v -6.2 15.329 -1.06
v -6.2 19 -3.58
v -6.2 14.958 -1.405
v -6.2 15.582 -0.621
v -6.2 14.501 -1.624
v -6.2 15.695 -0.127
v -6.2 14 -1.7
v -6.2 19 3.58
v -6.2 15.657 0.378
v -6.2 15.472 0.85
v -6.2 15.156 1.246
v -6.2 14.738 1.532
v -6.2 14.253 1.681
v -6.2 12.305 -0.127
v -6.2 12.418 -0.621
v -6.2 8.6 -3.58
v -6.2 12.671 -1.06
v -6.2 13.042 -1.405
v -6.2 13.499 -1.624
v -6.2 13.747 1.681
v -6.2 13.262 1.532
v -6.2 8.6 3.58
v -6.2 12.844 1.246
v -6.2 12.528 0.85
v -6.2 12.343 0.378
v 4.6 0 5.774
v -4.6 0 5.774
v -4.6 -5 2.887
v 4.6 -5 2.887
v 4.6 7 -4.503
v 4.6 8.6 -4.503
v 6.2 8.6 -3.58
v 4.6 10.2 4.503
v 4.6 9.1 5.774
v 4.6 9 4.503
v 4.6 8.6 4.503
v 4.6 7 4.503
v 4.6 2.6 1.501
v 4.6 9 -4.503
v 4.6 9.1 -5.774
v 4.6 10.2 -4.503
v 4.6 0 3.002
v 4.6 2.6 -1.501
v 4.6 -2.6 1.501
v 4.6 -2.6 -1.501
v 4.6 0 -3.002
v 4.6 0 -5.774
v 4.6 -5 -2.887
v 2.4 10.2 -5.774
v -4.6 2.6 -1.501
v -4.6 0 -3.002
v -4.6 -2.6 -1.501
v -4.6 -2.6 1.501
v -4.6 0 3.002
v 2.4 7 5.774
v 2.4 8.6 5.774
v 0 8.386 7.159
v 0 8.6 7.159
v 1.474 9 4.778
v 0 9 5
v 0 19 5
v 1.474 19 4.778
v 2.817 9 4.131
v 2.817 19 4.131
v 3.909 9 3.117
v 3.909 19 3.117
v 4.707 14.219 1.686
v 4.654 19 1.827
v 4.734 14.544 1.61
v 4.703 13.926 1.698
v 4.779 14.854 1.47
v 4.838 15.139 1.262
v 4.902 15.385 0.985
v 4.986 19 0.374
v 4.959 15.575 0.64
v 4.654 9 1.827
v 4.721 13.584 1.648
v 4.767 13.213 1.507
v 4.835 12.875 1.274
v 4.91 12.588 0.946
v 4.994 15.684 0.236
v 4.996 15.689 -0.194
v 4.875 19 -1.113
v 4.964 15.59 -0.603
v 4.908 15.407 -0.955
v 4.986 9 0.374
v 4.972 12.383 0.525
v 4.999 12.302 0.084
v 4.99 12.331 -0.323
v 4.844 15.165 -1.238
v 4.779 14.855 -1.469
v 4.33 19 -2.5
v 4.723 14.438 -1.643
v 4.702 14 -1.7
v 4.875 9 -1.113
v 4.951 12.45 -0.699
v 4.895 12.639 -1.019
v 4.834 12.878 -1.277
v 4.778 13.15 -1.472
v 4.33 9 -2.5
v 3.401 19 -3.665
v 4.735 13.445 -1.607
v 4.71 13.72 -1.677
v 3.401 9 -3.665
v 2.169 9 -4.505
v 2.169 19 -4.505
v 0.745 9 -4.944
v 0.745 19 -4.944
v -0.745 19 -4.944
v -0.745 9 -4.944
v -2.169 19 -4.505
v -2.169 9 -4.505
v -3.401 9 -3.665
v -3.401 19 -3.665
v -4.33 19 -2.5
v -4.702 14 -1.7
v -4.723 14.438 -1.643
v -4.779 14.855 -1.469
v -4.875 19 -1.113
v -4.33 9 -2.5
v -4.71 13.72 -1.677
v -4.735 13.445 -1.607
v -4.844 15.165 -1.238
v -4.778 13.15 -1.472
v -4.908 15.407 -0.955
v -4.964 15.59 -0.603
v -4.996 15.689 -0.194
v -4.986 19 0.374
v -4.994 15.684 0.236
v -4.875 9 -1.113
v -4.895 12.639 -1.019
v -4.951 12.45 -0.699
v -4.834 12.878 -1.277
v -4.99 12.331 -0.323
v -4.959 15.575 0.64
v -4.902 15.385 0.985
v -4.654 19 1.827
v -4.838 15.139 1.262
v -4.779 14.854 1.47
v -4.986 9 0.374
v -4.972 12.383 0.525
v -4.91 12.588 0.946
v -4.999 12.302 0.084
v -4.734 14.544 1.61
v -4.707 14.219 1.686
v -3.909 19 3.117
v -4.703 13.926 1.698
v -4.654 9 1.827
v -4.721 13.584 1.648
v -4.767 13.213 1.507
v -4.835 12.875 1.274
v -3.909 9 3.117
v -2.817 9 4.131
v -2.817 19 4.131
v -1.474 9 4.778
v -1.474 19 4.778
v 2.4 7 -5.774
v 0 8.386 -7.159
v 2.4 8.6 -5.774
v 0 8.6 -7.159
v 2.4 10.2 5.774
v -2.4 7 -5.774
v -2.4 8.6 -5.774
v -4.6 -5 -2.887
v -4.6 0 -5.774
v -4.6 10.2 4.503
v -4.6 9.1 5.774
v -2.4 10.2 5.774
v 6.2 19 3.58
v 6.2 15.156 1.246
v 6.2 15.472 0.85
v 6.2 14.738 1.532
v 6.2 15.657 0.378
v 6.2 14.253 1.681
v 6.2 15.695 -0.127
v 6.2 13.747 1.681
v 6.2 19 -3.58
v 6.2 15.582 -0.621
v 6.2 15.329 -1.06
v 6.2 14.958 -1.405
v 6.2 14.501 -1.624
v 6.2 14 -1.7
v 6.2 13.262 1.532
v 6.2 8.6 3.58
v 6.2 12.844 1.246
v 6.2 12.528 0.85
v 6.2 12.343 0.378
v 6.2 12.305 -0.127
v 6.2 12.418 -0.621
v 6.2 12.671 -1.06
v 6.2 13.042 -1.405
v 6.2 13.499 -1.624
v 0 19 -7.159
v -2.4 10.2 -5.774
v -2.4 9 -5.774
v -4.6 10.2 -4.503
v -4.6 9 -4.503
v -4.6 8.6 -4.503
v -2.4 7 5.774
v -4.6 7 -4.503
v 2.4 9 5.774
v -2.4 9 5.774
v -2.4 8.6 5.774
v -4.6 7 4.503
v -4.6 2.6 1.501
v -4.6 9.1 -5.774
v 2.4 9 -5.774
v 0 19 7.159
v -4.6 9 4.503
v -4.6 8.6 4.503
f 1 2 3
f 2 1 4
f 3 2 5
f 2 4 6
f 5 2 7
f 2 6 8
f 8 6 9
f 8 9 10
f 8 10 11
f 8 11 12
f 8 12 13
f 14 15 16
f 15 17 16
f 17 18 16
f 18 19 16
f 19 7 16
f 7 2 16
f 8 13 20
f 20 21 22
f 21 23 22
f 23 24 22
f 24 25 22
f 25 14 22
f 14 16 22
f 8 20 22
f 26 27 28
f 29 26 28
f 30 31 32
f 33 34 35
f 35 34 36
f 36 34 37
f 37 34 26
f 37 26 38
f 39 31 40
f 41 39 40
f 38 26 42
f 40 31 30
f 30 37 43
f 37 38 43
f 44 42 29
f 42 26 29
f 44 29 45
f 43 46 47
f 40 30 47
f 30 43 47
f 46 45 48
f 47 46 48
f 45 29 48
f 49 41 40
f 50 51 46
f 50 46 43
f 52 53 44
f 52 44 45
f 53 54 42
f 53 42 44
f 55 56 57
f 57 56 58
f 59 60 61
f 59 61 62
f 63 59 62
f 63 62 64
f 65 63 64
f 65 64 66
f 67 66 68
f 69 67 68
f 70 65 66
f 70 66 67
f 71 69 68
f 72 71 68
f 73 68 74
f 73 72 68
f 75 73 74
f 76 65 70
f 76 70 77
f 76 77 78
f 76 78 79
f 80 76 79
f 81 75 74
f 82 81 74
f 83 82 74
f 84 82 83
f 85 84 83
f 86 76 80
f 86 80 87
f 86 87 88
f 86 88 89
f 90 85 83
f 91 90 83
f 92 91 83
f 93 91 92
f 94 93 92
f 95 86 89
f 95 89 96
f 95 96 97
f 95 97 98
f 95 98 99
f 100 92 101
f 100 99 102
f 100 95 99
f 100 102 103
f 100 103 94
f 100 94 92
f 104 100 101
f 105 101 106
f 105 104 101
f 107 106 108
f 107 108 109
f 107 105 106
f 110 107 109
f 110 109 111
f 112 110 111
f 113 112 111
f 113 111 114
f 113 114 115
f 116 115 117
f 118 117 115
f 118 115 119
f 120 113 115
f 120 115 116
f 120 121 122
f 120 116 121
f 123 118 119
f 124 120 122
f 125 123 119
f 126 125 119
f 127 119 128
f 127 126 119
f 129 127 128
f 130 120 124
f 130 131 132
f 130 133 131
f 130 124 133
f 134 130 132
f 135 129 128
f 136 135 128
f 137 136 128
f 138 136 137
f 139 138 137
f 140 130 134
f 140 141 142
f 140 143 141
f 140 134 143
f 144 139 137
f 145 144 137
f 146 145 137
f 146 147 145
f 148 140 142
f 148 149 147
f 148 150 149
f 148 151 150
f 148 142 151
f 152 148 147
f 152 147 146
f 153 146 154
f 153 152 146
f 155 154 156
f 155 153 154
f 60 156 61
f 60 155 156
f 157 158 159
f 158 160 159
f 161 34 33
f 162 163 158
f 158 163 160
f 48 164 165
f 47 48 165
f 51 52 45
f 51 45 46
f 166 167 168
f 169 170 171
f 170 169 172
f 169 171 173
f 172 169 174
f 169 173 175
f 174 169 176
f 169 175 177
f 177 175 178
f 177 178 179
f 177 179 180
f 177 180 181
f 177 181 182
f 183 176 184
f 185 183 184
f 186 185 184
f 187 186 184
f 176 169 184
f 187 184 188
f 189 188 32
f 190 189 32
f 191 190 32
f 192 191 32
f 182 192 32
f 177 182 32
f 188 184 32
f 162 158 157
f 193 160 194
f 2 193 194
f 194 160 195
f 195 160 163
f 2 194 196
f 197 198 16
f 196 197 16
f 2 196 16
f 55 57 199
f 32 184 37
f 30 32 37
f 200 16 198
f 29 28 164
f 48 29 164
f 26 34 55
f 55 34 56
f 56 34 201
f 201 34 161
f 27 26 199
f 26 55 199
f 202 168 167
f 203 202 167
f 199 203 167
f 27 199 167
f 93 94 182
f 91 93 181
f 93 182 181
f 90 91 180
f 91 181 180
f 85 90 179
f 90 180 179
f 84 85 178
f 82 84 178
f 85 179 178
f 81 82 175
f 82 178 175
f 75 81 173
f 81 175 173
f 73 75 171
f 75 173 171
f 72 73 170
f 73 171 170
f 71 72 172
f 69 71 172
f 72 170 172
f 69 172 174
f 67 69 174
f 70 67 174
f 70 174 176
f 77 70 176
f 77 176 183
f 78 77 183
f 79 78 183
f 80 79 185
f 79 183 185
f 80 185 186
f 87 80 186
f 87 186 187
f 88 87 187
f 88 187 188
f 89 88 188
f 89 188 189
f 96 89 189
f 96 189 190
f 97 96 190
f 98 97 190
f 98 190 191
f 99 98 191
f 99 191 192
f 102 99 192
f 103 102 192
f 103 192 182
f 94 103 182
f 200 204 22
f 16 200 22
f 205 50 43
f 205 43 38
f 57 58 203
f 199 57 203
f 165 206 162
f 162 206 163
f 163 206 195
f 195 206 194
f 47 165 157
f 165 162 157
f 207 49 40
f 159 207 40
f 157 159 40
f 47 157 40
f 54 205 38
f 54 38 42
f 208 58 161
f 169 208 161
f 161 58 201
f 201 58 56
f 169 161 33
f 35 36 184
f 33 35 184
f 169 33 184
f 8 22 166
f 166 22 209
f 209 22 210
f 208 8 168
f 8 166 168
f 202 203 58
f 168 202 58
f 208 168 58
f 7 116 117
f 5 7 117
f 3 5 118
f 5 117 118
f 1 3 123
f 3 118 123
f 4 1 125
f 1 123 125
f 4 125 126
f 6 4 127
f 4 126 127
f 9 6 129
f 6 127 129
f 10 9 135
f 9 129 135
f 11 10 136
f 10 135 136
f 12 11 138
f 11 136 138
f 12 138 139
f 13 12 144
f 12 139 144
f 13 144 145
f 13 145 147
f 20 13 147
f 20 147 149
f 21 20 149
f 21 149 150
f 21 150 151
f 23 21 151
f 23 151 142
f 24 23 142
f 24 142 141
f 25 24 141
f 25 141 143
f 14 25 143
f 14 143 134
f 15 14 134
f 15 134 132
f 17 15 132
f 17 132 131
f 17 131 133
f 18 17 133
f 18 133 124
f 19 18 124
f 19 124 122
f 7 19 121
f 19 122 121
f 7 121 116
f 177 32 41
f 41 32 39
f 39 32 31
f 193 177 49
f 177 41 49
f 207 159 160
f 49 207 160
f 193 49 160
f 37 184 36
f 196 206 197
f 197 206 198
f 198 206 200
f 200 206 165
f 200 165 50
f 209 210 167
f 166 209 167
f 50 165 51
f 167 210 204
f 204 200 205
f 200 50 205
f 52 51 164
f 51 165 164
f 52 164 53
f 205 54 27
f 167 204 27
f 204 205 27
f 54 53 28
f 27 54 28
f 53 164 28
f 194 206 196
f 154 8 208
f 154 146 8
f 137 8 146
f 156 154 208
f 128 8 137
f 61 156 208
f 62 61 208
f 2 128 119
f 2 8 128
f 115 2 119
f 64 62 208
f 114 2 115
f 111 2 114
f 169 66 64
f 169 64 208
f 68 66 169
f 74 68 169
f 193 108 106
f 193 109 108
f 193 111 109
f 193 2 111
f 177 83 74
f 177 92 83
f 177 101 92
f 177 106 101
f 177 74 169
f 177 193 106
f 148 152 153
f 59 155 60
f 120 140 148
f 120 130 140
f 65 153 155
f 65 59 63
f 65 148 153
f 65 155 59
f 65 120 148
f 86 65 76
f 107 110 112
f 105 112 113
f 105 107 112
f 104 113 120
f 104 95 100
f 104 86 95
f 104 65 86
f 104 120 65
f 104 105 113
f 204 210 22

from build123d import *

# Parameters (mm, degrees)
SALIENTE_EXTRUIR1_DEPTH      = 4.6
SALIENTE_EXTRUIR1_DEPTH_BACK = 4.6
SALIENTE_EXTRUIR2_START      = 4
CROQUIS2_R                   = 5
SALIENTE_EXTRUIR2_DEPTH      = 10
CROQUIS4_W                   = 9.2
CROQUIS4_H                   = 2.771281292
SALIENTE_EXTRUIR3_DEPTH      = 9
SALIENTE_EXTRUIR4_START      = 2.6
CROQUIS4_3_W                 = 9.2
CROQUIS4_3_H                 = 6.0044428
SALIENTE_EXTRUIR4_DEPTH      = 6.4
SALIENTE_EXTRUIR5_START      = 3.6
CROQUIS2_2_R                 = 5
SALIENTE_EXTRUIR5_DEPTH      = 0.4
CHAFL_N1_SIZE                = 1.2
CHAFL_N2_SIZE                = 1.6
CROQUIS5_R                   = 1.7
CORTAR_EXTRUIR1_DEPTH        = 24.791034726


with BuildPart() as part:
    # Croquis1 → Saliente-Extruir1 (new, two sides: drawn at the far end of the back side and taken through both)
    with BuildSketch(Plane(origin=(0, 0, 0), x_dir=(0, 0, -1), z_dir=(1, 0, 0)).offset(-SALIENTE_EXTRUIR1_DEPTH_BACK)):
        Polygon((2.886751346, 5), (-2.886751346, 5), (-5.773502692, 0), (-2.886751346, -5), (2.886751346, -5), (5.773502692, 0), align=None)
        Polygon((3.0022214, 0), (1.5011107, 2.6), (-1.5011107, 2.6), (-3.0022214, 0), (-1.5011107, -2.6), (1.5011107, -2.6), align=None, mode=Mode.SUBTRACT)
    extrude(amount=SALIENTE_EXTRUIR1_DEPTH + SALIENTE_EXTRUIR1_DEPTH_BACK)



with BuildPart() as body_2:
    # Croquis2 → Saliente-Extruir2 (new body)
    with BuildSketch(Plane(origin=(0, 5, 0), x_dir=(1, 0, 0), z_dir=(0, 1, 0)).offset(SALIENTE_EXTRUIR2_START)):
        Polygon((0, 7.159143338), (-6.2, 3.579571669), (-6.2, -3.579571669), (0, -7.159143338), (6.2, -3.579571669), (6.2, 3.579571669), align=None)
        with Locations(Location((0, 0, 0), (0, 0, 270))):
            Circle(CROQUIS2_R, mode=Mode.SUBTRACT)
    extrude(amount=SALIENTE_EXTRUIR2_DEPTH)


with BuildPart() as part_1:
    add(part.part)

    add(body_2.part)  # Saliente-Extruir3 merges body 2
    # Croquis4 → Saliente-Extruir3 (add)
    with BuildSketch(Plane(origin=(0, 0, 0), x_dir=(1, 0, 0), z_dir=(0, 1, 0))):
        with Locations((0, -4.387862046)):
            Rectangle(CROQUIS4_W, CROQUIS4_H)
        with Locations((0, 4.387862046)):
            Rectangle(CROQUIS4_W, CROQUIS4_H)
    extrude(amount=SALIENTE_EXTRUIR3_DEPTH)

    # Croquis4<3> → Saliente-Extruir4 (add)
    with BuildSketch(Plane(origin=(0, 0, 0), x_dir=(1, 0, 0), z_dir=(0, 1, 0)).offset(SALIENTE_EXTRUIR4_START)):
        Rectangle(CROQUIS4_3_W, CROQUIS4_3_H)
    extrude(amount=SALIENTE_EXTRUIR4_DEPTH)

    # Croquis2<2> → Saliente-Extruir5 (add)
    # profile 1 of 2: a face of its own
    with BuildSketch(Plane(origin=(0, 5, 0), x_dir=(1, 0, 0), z_dir=(0, 1, 0)).offset(SALIENTE_EXTRUIR5_START)):
        Polygon((6.2, -3.579571669), (6.2, 3.579571669), (0, 7.159143338), (-6.2, 3.579571669), (-6.2, -3.579571669), (0, -7.159143338), align=None)
        with Locations(Location((0, 0, 0), (0, 0, 270))):
            Circle(CROQUIS2_2_R, mode=Mode.SUBTRACT)
    # profile 2 of 2: a face of its own
    with BuildSketch(Plane(origin=(0, 5, 0), x_dir=(1, 0, 0), z_dir=(0, 1, 0)).offset(SALIENTE_EXTRUIR5_START)):
        with Locations(Location((0, 0, 0), (0, 0, 270))):
            Circle(CROQUIS2_2_R)
    extrude(amount=SALIENTE_EXTRUIR5_DEPTH)

    # Chaflán1
    # the kernel refuses this chamfer: 1.2 mm, written as the material it adds along each edge
    with BuildSketch(Plane(origin=(-0.272571358, 9, 7.316512485), x_dir=(0.49981095845564805, -0.027495876610585935, 0.8656979742248805), z_dir=(0.8660254037844388, 0, -0.49999999999999967))) as chafl_n1_piece_1_section:
        Polygon((CHAFL_N1_SIZE * 0.999621916911, -CHAFL_N1_SIZE * 0.0274958766106), (-CHAFL_N1_SIZE * 0.0274958766106, -CHAFL_N1_SIZE * 0.999621916911), (0, 0), align=None)
    chafl_n1_piece_1 = extrude(amount=8.712380356, mode=Mode.PRIVATE)
    chafl_n1_piece_1 = split(chafl_n1_piece_1, bisect_by=Plane(origin=(4.6, 9.457, 5.303539573), z_dir=(-1, 0, 0)), keep=Keep.TOP, mode=Mode.PRIVATE)
    chafl_n1_piece_1 = split(chafl_n1_piece_1, bisect_by=Plane(origin=(3.786, 9.457, 5.773502692), z_dir=(0, 0, -1)), keep=Keep.TOP, mode=Mode.PRIVATE)
    add(chafl_n1_piece_1)
    with BuildSketch(Plane(origin=(-7.272571358, 9, 2.960322307), x_dir=(-0.4998109584556484, -0.027495876610585918, 0.8656979742248802), z_dir=(0.8660254037844387, 0, 0.5000000000000001))) as chafl_n1_piece_2_section:
        Polygon((CHAFL_N1_SIZE * 0.999621916911, -CHAFL_N1_SIZE * 0.0274958766106), (-CHAFL_N1_SIZE * 0.0274958766106, -CHAFL_N1_SIZE * 0.999621916911), (0, 0), align=None)
    chafl_n1_piece_2 = extrude(amount=8.712380356, mode=Mode.PRIVATE)
    chafl_n1_piece_2 = split(chafl_n1_piece_2, bisect_by=Plane(origin=(-4.6, 9.457, 5.303539573), z_dir=(1, 0, 0)), keep=Keep.TOP, mode=Mode.PRIVATE)
    chafl_n1_piece_2 = split(chafl_n1_piece_2, bisect_by=Plane(origin=(-3.786, 9.457, 5.773502692), z_dir=(0, 0, -1)), keep=Keep.TOP, mode=Mode.PRIVATE)
    add(chafl_n1_piece_2)
    with BuildSketch(Plane(origin=(0.272571358, 9, -7.316512485), x_dir=(-0.49981095845564827, -0.027495876610585914, -0.8656979742248804), z_dir=(-0.8660254037844387, 0, 0.49999999999999994))) as chafl_n1_piece_3_section:
        Polygon((CHAFL_N1_SIZE * 0.999621916911, -CHAFL_N1_SIZE * 0.0274958766106), (-CHAFL_N1_SIZE * 0.0274958766106, -CHAFL_N1_SIZE * 0.999621916911), (0, 0), align=None)
    chafl_n1_piece_3 = extrude(amount=8.712380356, mode=Mode.PRIVATE)
    chafl_n1_piece_3 = split(chafl_n1_piece_3, bisect_by=Plane(origin=(-4.6, 9.457, -5.303539573), z_dir=(1, 0, 0)), keep=Keep.TOP, mode=Mode.PRIVATE)
    chafl_n1_piece_3 = split(chafl_n1_piece_3, bisect_by=Plane(origin=(-3.786, 9.457, -5.773502692), z_dir=(0, 0, 1)), keep=Keep.TOP, mode=Mode.PRIVATE)
    add(chafl_n1_piece_3)
    with BuildSketch(Plane(origin=(7.272571358, 9, -2.960322307), x_dir=(-0.013747938305293247, 0.9996219169112968, 0.023812127644090377), z_dir=(-0.8660254037844387, 0, -0.5000000000000001))) as chafl_n1_piece_4_section:
        Polygon((CHAFL_N1_SIZE * 0.999621916911, CHAFL_N1_SIZE * 0.0274958766106), (-CHAFL_N1_SIZE * 0.0274958766106, CHAFL_N1_SIZE * 0.999621916911), (0, 0), align=None)
    chafl_n1_piece_4 = extrude(amount=8.712380356, mode=Mode.PRIVATE)
    chafl_n1_piece_4 = split(chafl_n1_piece_4, bisect_by=Plane(origin=(4.6, 9.457, -5.303539573), z_dir=(-1, 0, 0)), keep=Keep.TOP, mode=Mode.PRIVATE)
    chafl_n1_piece_4 = split(chafl_n1_piece_4, bisect_by=Plane(origin=(3.786, 9.457, -5.773502692), z_dir=(0, 0, 1)), keep=Keep.TOP, mode=Mode.PRIVATE)
    add(chafl_n1_piece_4)

    # Chaflán2
    # the kernel refuses this chamfer: 1.6 mm, written as the material it adds along each edge
    with BuildSketch(Plane(origin=(4.6, 8.6, -8.61802488), x_dir=(0.9996219169112968, 0.027495876610586285, 0), z_dir=(0, 0, 1))) as chafl_n2_piece_1_section:
        Polygon((CHAFL_N2_SIZE * 0.999621916911, -CHAFL_N2_SIZE * 0.0274958766106), (-CHAFL_N2_SIZE * 0.0274958766106, -CHAFL_N2_SIZE * 0.999621916911), (0, 0), align=None)
    chafl_n2_piece_1 = extrude(amount=17.236049761, mode=Mode.PRIVATE)
    chafl_n2_piece_1 = split(chafl_n2_piece_1, bisect_by=Plane(origin=(6.927780638, 8.059532411, -3.159387322), z_dir=(-0.5000000000000001, 0, 0.8660254037844387)), keep=Keep.TOP, mode=Mode.PRIVATE)
    chafl_n2_piece_1 = split(chafl_n2_piece_1, bisect_by=Plane(origin=(6.927780638, 8.059532411, 3.159387322), z_dir=(-0.49999999999999967, 0, -0.8660254037844388)), keep=Keep.TOP, mode=Mode.PRIVATE)
    chafl_n2_piece_1 = split(chafl_n2_piece_1, bisect_by=Plane(origin=(6.2, 8.059532411, 0), z_dir=(-1, 0, 0)), keep=Keep.TOP, mode=Mode.PRIVATE)
    add(chafl_n2_piece_1)
    with BuildSketch(Plane(origin=(-6.514692781, 8.6, -5.773502692), x_dir=(0, 0.027495876610586265, -0.9996219169112966), z_dir=(1, 0, 0))) as chafl_n2_piece_2_section:
        Polygon((CHAFL_N2_SIZE * 0.999621916911, -CHAFL_N2_SIZE * 0.0274958766106), (-CHAFL_N2_SIZE * 0.0274958766106, -CHAFL_N2_SIZE * 0.999621916911), (0, 0), align=None)
    chafl_n2_piece_2 = extrude(amount=13.029385561, mode=Mode.PRIVATE)
    chafl_n2_piece_2 = split(chafl_n2_piece_2, bisect_by=Plane(origin=(0.451958261, 7.972982249, -6.898205114), z_dir=(-0.5000000000000001, 0, 0.8660254037844387)), keep=Keep.TOP, mode=Mode.PRIVATE)
    chafl_n2_piece_2 = split(chafl_n2_piece_2, bisect_by=Plane(origin=(-0.451958261, 7.972982249, -6.898205114), z_dir=(0.49999999999999994, 0, 0.8660254037844387)), keep=Keep.TOP, mode=Mode.PRIVATE)
    add(chafl_n2_piece_2)
    with BuildSketch(Plane(origin=(-4.6, 8.6, -8.61802488), x_dir=(0.027495876610586285, -0.9996219169112968, 0), z_dir=(0, 0, 1))) as chafl_n2_piece_3_section:
        Polygon((CHAFL_N2_SIZE * 0.999621916911, -CHAFL_N2_SIZE * 0.0274958766106), (-CHAFL_N2_SIZE * 0.0274958766106, -CHAFL_N2_SIZE * 0.999621916911), (0, 0), align=None)
    chafl_n2_piece_3 = extrude(amount=17.236049761, mode=Mode.PRIVATE)
    chafl_n2_piece_3 = split(chafl_n2_piece_3, bisect_by=Plane(origin=(-6.927780638, 8.059532411, -3.159387322), z_dir=(0.49999999999999994, 0, 0.8660254037844387)), keep=Keep.TOP, mode=Mode.PRIVATE)
    chafl_n2_piece_3 = split(chafl_n2_piece_3, bisect_by=Plane(origin=(-6.927780638, 8.059532411, 3.159387322), z_dir=(0.5000000000000001, 0, -0.8660254037844387)), keep=Keep.TOP, mode=Mode.PRIVATE)
    chafl_n2_piece_3 = split(chafl_n2_piece_3, bisect_by=Plane(origin=(-6.2, 8.059532411, 0), z_dir=(1, 0, 0)), keep=Keep.TOP, mode=Mode.PRIVATE)
    add(chafl_n2_piece_3)
    with BuildSketch(Plane(origin=(-6.514692781, 8.6, 5.773502692), x_dir=(0, 0.027495876610586265, 0.9996219169112966), z_dir=(1, 0, 0))) as chafl_n2_piece_4_section:
        Polygon((CHAFL_N2_SIZE * 0.999621916911, CHAFL_N2_SIZE * 0.0274958766106), (-CHAFL_N2_SIZE * 0.0274958766106, CHAFL_N2_SIZE * 0.999621916911), (0, 0), align=None)
    chafl_n2_piece_4 = extrude(amount=13.029385561, mode=Mode.PRIVATE)
    chafl_n2_piece_4 = split(chafl_n2_piece_4, bisect_by=Plane(origin=(0.451958261, 7.972982249, 6.898205114), z_dir=(-0.49999999999999967, 0, -0.8660254037844388)), keep=Keep.TOP, mode=Mode.PRIVATE)
    chafl_n2_piece_4 = split(chafl_n2_piece_4, bisect_by=Plane(origin=(-0.451958261, 7.972982249, 6.898205114), z_dir=(0.5000000000000001, 0, -0.8660254037844387)), keep=Keep.TOP, mode=Mode.PRIVATE)
    add(chafl_n2_piece_4)

    # Croquis5 → Cortar-Extruir1 (cut, through all)
    with BuildSketch(Plane(origin=(6.2, 0, 0), x_dir=(0, 0, -1), z_dir=(1, 0, 0))):
        with Locations((0, 14)):
            Circle(CROQUIS5_R)
    extrude(amount=-CORTAR_EXTRUIR1_DEPTH, mode=Mode.SUBTRACT)


solid = part_1.part
